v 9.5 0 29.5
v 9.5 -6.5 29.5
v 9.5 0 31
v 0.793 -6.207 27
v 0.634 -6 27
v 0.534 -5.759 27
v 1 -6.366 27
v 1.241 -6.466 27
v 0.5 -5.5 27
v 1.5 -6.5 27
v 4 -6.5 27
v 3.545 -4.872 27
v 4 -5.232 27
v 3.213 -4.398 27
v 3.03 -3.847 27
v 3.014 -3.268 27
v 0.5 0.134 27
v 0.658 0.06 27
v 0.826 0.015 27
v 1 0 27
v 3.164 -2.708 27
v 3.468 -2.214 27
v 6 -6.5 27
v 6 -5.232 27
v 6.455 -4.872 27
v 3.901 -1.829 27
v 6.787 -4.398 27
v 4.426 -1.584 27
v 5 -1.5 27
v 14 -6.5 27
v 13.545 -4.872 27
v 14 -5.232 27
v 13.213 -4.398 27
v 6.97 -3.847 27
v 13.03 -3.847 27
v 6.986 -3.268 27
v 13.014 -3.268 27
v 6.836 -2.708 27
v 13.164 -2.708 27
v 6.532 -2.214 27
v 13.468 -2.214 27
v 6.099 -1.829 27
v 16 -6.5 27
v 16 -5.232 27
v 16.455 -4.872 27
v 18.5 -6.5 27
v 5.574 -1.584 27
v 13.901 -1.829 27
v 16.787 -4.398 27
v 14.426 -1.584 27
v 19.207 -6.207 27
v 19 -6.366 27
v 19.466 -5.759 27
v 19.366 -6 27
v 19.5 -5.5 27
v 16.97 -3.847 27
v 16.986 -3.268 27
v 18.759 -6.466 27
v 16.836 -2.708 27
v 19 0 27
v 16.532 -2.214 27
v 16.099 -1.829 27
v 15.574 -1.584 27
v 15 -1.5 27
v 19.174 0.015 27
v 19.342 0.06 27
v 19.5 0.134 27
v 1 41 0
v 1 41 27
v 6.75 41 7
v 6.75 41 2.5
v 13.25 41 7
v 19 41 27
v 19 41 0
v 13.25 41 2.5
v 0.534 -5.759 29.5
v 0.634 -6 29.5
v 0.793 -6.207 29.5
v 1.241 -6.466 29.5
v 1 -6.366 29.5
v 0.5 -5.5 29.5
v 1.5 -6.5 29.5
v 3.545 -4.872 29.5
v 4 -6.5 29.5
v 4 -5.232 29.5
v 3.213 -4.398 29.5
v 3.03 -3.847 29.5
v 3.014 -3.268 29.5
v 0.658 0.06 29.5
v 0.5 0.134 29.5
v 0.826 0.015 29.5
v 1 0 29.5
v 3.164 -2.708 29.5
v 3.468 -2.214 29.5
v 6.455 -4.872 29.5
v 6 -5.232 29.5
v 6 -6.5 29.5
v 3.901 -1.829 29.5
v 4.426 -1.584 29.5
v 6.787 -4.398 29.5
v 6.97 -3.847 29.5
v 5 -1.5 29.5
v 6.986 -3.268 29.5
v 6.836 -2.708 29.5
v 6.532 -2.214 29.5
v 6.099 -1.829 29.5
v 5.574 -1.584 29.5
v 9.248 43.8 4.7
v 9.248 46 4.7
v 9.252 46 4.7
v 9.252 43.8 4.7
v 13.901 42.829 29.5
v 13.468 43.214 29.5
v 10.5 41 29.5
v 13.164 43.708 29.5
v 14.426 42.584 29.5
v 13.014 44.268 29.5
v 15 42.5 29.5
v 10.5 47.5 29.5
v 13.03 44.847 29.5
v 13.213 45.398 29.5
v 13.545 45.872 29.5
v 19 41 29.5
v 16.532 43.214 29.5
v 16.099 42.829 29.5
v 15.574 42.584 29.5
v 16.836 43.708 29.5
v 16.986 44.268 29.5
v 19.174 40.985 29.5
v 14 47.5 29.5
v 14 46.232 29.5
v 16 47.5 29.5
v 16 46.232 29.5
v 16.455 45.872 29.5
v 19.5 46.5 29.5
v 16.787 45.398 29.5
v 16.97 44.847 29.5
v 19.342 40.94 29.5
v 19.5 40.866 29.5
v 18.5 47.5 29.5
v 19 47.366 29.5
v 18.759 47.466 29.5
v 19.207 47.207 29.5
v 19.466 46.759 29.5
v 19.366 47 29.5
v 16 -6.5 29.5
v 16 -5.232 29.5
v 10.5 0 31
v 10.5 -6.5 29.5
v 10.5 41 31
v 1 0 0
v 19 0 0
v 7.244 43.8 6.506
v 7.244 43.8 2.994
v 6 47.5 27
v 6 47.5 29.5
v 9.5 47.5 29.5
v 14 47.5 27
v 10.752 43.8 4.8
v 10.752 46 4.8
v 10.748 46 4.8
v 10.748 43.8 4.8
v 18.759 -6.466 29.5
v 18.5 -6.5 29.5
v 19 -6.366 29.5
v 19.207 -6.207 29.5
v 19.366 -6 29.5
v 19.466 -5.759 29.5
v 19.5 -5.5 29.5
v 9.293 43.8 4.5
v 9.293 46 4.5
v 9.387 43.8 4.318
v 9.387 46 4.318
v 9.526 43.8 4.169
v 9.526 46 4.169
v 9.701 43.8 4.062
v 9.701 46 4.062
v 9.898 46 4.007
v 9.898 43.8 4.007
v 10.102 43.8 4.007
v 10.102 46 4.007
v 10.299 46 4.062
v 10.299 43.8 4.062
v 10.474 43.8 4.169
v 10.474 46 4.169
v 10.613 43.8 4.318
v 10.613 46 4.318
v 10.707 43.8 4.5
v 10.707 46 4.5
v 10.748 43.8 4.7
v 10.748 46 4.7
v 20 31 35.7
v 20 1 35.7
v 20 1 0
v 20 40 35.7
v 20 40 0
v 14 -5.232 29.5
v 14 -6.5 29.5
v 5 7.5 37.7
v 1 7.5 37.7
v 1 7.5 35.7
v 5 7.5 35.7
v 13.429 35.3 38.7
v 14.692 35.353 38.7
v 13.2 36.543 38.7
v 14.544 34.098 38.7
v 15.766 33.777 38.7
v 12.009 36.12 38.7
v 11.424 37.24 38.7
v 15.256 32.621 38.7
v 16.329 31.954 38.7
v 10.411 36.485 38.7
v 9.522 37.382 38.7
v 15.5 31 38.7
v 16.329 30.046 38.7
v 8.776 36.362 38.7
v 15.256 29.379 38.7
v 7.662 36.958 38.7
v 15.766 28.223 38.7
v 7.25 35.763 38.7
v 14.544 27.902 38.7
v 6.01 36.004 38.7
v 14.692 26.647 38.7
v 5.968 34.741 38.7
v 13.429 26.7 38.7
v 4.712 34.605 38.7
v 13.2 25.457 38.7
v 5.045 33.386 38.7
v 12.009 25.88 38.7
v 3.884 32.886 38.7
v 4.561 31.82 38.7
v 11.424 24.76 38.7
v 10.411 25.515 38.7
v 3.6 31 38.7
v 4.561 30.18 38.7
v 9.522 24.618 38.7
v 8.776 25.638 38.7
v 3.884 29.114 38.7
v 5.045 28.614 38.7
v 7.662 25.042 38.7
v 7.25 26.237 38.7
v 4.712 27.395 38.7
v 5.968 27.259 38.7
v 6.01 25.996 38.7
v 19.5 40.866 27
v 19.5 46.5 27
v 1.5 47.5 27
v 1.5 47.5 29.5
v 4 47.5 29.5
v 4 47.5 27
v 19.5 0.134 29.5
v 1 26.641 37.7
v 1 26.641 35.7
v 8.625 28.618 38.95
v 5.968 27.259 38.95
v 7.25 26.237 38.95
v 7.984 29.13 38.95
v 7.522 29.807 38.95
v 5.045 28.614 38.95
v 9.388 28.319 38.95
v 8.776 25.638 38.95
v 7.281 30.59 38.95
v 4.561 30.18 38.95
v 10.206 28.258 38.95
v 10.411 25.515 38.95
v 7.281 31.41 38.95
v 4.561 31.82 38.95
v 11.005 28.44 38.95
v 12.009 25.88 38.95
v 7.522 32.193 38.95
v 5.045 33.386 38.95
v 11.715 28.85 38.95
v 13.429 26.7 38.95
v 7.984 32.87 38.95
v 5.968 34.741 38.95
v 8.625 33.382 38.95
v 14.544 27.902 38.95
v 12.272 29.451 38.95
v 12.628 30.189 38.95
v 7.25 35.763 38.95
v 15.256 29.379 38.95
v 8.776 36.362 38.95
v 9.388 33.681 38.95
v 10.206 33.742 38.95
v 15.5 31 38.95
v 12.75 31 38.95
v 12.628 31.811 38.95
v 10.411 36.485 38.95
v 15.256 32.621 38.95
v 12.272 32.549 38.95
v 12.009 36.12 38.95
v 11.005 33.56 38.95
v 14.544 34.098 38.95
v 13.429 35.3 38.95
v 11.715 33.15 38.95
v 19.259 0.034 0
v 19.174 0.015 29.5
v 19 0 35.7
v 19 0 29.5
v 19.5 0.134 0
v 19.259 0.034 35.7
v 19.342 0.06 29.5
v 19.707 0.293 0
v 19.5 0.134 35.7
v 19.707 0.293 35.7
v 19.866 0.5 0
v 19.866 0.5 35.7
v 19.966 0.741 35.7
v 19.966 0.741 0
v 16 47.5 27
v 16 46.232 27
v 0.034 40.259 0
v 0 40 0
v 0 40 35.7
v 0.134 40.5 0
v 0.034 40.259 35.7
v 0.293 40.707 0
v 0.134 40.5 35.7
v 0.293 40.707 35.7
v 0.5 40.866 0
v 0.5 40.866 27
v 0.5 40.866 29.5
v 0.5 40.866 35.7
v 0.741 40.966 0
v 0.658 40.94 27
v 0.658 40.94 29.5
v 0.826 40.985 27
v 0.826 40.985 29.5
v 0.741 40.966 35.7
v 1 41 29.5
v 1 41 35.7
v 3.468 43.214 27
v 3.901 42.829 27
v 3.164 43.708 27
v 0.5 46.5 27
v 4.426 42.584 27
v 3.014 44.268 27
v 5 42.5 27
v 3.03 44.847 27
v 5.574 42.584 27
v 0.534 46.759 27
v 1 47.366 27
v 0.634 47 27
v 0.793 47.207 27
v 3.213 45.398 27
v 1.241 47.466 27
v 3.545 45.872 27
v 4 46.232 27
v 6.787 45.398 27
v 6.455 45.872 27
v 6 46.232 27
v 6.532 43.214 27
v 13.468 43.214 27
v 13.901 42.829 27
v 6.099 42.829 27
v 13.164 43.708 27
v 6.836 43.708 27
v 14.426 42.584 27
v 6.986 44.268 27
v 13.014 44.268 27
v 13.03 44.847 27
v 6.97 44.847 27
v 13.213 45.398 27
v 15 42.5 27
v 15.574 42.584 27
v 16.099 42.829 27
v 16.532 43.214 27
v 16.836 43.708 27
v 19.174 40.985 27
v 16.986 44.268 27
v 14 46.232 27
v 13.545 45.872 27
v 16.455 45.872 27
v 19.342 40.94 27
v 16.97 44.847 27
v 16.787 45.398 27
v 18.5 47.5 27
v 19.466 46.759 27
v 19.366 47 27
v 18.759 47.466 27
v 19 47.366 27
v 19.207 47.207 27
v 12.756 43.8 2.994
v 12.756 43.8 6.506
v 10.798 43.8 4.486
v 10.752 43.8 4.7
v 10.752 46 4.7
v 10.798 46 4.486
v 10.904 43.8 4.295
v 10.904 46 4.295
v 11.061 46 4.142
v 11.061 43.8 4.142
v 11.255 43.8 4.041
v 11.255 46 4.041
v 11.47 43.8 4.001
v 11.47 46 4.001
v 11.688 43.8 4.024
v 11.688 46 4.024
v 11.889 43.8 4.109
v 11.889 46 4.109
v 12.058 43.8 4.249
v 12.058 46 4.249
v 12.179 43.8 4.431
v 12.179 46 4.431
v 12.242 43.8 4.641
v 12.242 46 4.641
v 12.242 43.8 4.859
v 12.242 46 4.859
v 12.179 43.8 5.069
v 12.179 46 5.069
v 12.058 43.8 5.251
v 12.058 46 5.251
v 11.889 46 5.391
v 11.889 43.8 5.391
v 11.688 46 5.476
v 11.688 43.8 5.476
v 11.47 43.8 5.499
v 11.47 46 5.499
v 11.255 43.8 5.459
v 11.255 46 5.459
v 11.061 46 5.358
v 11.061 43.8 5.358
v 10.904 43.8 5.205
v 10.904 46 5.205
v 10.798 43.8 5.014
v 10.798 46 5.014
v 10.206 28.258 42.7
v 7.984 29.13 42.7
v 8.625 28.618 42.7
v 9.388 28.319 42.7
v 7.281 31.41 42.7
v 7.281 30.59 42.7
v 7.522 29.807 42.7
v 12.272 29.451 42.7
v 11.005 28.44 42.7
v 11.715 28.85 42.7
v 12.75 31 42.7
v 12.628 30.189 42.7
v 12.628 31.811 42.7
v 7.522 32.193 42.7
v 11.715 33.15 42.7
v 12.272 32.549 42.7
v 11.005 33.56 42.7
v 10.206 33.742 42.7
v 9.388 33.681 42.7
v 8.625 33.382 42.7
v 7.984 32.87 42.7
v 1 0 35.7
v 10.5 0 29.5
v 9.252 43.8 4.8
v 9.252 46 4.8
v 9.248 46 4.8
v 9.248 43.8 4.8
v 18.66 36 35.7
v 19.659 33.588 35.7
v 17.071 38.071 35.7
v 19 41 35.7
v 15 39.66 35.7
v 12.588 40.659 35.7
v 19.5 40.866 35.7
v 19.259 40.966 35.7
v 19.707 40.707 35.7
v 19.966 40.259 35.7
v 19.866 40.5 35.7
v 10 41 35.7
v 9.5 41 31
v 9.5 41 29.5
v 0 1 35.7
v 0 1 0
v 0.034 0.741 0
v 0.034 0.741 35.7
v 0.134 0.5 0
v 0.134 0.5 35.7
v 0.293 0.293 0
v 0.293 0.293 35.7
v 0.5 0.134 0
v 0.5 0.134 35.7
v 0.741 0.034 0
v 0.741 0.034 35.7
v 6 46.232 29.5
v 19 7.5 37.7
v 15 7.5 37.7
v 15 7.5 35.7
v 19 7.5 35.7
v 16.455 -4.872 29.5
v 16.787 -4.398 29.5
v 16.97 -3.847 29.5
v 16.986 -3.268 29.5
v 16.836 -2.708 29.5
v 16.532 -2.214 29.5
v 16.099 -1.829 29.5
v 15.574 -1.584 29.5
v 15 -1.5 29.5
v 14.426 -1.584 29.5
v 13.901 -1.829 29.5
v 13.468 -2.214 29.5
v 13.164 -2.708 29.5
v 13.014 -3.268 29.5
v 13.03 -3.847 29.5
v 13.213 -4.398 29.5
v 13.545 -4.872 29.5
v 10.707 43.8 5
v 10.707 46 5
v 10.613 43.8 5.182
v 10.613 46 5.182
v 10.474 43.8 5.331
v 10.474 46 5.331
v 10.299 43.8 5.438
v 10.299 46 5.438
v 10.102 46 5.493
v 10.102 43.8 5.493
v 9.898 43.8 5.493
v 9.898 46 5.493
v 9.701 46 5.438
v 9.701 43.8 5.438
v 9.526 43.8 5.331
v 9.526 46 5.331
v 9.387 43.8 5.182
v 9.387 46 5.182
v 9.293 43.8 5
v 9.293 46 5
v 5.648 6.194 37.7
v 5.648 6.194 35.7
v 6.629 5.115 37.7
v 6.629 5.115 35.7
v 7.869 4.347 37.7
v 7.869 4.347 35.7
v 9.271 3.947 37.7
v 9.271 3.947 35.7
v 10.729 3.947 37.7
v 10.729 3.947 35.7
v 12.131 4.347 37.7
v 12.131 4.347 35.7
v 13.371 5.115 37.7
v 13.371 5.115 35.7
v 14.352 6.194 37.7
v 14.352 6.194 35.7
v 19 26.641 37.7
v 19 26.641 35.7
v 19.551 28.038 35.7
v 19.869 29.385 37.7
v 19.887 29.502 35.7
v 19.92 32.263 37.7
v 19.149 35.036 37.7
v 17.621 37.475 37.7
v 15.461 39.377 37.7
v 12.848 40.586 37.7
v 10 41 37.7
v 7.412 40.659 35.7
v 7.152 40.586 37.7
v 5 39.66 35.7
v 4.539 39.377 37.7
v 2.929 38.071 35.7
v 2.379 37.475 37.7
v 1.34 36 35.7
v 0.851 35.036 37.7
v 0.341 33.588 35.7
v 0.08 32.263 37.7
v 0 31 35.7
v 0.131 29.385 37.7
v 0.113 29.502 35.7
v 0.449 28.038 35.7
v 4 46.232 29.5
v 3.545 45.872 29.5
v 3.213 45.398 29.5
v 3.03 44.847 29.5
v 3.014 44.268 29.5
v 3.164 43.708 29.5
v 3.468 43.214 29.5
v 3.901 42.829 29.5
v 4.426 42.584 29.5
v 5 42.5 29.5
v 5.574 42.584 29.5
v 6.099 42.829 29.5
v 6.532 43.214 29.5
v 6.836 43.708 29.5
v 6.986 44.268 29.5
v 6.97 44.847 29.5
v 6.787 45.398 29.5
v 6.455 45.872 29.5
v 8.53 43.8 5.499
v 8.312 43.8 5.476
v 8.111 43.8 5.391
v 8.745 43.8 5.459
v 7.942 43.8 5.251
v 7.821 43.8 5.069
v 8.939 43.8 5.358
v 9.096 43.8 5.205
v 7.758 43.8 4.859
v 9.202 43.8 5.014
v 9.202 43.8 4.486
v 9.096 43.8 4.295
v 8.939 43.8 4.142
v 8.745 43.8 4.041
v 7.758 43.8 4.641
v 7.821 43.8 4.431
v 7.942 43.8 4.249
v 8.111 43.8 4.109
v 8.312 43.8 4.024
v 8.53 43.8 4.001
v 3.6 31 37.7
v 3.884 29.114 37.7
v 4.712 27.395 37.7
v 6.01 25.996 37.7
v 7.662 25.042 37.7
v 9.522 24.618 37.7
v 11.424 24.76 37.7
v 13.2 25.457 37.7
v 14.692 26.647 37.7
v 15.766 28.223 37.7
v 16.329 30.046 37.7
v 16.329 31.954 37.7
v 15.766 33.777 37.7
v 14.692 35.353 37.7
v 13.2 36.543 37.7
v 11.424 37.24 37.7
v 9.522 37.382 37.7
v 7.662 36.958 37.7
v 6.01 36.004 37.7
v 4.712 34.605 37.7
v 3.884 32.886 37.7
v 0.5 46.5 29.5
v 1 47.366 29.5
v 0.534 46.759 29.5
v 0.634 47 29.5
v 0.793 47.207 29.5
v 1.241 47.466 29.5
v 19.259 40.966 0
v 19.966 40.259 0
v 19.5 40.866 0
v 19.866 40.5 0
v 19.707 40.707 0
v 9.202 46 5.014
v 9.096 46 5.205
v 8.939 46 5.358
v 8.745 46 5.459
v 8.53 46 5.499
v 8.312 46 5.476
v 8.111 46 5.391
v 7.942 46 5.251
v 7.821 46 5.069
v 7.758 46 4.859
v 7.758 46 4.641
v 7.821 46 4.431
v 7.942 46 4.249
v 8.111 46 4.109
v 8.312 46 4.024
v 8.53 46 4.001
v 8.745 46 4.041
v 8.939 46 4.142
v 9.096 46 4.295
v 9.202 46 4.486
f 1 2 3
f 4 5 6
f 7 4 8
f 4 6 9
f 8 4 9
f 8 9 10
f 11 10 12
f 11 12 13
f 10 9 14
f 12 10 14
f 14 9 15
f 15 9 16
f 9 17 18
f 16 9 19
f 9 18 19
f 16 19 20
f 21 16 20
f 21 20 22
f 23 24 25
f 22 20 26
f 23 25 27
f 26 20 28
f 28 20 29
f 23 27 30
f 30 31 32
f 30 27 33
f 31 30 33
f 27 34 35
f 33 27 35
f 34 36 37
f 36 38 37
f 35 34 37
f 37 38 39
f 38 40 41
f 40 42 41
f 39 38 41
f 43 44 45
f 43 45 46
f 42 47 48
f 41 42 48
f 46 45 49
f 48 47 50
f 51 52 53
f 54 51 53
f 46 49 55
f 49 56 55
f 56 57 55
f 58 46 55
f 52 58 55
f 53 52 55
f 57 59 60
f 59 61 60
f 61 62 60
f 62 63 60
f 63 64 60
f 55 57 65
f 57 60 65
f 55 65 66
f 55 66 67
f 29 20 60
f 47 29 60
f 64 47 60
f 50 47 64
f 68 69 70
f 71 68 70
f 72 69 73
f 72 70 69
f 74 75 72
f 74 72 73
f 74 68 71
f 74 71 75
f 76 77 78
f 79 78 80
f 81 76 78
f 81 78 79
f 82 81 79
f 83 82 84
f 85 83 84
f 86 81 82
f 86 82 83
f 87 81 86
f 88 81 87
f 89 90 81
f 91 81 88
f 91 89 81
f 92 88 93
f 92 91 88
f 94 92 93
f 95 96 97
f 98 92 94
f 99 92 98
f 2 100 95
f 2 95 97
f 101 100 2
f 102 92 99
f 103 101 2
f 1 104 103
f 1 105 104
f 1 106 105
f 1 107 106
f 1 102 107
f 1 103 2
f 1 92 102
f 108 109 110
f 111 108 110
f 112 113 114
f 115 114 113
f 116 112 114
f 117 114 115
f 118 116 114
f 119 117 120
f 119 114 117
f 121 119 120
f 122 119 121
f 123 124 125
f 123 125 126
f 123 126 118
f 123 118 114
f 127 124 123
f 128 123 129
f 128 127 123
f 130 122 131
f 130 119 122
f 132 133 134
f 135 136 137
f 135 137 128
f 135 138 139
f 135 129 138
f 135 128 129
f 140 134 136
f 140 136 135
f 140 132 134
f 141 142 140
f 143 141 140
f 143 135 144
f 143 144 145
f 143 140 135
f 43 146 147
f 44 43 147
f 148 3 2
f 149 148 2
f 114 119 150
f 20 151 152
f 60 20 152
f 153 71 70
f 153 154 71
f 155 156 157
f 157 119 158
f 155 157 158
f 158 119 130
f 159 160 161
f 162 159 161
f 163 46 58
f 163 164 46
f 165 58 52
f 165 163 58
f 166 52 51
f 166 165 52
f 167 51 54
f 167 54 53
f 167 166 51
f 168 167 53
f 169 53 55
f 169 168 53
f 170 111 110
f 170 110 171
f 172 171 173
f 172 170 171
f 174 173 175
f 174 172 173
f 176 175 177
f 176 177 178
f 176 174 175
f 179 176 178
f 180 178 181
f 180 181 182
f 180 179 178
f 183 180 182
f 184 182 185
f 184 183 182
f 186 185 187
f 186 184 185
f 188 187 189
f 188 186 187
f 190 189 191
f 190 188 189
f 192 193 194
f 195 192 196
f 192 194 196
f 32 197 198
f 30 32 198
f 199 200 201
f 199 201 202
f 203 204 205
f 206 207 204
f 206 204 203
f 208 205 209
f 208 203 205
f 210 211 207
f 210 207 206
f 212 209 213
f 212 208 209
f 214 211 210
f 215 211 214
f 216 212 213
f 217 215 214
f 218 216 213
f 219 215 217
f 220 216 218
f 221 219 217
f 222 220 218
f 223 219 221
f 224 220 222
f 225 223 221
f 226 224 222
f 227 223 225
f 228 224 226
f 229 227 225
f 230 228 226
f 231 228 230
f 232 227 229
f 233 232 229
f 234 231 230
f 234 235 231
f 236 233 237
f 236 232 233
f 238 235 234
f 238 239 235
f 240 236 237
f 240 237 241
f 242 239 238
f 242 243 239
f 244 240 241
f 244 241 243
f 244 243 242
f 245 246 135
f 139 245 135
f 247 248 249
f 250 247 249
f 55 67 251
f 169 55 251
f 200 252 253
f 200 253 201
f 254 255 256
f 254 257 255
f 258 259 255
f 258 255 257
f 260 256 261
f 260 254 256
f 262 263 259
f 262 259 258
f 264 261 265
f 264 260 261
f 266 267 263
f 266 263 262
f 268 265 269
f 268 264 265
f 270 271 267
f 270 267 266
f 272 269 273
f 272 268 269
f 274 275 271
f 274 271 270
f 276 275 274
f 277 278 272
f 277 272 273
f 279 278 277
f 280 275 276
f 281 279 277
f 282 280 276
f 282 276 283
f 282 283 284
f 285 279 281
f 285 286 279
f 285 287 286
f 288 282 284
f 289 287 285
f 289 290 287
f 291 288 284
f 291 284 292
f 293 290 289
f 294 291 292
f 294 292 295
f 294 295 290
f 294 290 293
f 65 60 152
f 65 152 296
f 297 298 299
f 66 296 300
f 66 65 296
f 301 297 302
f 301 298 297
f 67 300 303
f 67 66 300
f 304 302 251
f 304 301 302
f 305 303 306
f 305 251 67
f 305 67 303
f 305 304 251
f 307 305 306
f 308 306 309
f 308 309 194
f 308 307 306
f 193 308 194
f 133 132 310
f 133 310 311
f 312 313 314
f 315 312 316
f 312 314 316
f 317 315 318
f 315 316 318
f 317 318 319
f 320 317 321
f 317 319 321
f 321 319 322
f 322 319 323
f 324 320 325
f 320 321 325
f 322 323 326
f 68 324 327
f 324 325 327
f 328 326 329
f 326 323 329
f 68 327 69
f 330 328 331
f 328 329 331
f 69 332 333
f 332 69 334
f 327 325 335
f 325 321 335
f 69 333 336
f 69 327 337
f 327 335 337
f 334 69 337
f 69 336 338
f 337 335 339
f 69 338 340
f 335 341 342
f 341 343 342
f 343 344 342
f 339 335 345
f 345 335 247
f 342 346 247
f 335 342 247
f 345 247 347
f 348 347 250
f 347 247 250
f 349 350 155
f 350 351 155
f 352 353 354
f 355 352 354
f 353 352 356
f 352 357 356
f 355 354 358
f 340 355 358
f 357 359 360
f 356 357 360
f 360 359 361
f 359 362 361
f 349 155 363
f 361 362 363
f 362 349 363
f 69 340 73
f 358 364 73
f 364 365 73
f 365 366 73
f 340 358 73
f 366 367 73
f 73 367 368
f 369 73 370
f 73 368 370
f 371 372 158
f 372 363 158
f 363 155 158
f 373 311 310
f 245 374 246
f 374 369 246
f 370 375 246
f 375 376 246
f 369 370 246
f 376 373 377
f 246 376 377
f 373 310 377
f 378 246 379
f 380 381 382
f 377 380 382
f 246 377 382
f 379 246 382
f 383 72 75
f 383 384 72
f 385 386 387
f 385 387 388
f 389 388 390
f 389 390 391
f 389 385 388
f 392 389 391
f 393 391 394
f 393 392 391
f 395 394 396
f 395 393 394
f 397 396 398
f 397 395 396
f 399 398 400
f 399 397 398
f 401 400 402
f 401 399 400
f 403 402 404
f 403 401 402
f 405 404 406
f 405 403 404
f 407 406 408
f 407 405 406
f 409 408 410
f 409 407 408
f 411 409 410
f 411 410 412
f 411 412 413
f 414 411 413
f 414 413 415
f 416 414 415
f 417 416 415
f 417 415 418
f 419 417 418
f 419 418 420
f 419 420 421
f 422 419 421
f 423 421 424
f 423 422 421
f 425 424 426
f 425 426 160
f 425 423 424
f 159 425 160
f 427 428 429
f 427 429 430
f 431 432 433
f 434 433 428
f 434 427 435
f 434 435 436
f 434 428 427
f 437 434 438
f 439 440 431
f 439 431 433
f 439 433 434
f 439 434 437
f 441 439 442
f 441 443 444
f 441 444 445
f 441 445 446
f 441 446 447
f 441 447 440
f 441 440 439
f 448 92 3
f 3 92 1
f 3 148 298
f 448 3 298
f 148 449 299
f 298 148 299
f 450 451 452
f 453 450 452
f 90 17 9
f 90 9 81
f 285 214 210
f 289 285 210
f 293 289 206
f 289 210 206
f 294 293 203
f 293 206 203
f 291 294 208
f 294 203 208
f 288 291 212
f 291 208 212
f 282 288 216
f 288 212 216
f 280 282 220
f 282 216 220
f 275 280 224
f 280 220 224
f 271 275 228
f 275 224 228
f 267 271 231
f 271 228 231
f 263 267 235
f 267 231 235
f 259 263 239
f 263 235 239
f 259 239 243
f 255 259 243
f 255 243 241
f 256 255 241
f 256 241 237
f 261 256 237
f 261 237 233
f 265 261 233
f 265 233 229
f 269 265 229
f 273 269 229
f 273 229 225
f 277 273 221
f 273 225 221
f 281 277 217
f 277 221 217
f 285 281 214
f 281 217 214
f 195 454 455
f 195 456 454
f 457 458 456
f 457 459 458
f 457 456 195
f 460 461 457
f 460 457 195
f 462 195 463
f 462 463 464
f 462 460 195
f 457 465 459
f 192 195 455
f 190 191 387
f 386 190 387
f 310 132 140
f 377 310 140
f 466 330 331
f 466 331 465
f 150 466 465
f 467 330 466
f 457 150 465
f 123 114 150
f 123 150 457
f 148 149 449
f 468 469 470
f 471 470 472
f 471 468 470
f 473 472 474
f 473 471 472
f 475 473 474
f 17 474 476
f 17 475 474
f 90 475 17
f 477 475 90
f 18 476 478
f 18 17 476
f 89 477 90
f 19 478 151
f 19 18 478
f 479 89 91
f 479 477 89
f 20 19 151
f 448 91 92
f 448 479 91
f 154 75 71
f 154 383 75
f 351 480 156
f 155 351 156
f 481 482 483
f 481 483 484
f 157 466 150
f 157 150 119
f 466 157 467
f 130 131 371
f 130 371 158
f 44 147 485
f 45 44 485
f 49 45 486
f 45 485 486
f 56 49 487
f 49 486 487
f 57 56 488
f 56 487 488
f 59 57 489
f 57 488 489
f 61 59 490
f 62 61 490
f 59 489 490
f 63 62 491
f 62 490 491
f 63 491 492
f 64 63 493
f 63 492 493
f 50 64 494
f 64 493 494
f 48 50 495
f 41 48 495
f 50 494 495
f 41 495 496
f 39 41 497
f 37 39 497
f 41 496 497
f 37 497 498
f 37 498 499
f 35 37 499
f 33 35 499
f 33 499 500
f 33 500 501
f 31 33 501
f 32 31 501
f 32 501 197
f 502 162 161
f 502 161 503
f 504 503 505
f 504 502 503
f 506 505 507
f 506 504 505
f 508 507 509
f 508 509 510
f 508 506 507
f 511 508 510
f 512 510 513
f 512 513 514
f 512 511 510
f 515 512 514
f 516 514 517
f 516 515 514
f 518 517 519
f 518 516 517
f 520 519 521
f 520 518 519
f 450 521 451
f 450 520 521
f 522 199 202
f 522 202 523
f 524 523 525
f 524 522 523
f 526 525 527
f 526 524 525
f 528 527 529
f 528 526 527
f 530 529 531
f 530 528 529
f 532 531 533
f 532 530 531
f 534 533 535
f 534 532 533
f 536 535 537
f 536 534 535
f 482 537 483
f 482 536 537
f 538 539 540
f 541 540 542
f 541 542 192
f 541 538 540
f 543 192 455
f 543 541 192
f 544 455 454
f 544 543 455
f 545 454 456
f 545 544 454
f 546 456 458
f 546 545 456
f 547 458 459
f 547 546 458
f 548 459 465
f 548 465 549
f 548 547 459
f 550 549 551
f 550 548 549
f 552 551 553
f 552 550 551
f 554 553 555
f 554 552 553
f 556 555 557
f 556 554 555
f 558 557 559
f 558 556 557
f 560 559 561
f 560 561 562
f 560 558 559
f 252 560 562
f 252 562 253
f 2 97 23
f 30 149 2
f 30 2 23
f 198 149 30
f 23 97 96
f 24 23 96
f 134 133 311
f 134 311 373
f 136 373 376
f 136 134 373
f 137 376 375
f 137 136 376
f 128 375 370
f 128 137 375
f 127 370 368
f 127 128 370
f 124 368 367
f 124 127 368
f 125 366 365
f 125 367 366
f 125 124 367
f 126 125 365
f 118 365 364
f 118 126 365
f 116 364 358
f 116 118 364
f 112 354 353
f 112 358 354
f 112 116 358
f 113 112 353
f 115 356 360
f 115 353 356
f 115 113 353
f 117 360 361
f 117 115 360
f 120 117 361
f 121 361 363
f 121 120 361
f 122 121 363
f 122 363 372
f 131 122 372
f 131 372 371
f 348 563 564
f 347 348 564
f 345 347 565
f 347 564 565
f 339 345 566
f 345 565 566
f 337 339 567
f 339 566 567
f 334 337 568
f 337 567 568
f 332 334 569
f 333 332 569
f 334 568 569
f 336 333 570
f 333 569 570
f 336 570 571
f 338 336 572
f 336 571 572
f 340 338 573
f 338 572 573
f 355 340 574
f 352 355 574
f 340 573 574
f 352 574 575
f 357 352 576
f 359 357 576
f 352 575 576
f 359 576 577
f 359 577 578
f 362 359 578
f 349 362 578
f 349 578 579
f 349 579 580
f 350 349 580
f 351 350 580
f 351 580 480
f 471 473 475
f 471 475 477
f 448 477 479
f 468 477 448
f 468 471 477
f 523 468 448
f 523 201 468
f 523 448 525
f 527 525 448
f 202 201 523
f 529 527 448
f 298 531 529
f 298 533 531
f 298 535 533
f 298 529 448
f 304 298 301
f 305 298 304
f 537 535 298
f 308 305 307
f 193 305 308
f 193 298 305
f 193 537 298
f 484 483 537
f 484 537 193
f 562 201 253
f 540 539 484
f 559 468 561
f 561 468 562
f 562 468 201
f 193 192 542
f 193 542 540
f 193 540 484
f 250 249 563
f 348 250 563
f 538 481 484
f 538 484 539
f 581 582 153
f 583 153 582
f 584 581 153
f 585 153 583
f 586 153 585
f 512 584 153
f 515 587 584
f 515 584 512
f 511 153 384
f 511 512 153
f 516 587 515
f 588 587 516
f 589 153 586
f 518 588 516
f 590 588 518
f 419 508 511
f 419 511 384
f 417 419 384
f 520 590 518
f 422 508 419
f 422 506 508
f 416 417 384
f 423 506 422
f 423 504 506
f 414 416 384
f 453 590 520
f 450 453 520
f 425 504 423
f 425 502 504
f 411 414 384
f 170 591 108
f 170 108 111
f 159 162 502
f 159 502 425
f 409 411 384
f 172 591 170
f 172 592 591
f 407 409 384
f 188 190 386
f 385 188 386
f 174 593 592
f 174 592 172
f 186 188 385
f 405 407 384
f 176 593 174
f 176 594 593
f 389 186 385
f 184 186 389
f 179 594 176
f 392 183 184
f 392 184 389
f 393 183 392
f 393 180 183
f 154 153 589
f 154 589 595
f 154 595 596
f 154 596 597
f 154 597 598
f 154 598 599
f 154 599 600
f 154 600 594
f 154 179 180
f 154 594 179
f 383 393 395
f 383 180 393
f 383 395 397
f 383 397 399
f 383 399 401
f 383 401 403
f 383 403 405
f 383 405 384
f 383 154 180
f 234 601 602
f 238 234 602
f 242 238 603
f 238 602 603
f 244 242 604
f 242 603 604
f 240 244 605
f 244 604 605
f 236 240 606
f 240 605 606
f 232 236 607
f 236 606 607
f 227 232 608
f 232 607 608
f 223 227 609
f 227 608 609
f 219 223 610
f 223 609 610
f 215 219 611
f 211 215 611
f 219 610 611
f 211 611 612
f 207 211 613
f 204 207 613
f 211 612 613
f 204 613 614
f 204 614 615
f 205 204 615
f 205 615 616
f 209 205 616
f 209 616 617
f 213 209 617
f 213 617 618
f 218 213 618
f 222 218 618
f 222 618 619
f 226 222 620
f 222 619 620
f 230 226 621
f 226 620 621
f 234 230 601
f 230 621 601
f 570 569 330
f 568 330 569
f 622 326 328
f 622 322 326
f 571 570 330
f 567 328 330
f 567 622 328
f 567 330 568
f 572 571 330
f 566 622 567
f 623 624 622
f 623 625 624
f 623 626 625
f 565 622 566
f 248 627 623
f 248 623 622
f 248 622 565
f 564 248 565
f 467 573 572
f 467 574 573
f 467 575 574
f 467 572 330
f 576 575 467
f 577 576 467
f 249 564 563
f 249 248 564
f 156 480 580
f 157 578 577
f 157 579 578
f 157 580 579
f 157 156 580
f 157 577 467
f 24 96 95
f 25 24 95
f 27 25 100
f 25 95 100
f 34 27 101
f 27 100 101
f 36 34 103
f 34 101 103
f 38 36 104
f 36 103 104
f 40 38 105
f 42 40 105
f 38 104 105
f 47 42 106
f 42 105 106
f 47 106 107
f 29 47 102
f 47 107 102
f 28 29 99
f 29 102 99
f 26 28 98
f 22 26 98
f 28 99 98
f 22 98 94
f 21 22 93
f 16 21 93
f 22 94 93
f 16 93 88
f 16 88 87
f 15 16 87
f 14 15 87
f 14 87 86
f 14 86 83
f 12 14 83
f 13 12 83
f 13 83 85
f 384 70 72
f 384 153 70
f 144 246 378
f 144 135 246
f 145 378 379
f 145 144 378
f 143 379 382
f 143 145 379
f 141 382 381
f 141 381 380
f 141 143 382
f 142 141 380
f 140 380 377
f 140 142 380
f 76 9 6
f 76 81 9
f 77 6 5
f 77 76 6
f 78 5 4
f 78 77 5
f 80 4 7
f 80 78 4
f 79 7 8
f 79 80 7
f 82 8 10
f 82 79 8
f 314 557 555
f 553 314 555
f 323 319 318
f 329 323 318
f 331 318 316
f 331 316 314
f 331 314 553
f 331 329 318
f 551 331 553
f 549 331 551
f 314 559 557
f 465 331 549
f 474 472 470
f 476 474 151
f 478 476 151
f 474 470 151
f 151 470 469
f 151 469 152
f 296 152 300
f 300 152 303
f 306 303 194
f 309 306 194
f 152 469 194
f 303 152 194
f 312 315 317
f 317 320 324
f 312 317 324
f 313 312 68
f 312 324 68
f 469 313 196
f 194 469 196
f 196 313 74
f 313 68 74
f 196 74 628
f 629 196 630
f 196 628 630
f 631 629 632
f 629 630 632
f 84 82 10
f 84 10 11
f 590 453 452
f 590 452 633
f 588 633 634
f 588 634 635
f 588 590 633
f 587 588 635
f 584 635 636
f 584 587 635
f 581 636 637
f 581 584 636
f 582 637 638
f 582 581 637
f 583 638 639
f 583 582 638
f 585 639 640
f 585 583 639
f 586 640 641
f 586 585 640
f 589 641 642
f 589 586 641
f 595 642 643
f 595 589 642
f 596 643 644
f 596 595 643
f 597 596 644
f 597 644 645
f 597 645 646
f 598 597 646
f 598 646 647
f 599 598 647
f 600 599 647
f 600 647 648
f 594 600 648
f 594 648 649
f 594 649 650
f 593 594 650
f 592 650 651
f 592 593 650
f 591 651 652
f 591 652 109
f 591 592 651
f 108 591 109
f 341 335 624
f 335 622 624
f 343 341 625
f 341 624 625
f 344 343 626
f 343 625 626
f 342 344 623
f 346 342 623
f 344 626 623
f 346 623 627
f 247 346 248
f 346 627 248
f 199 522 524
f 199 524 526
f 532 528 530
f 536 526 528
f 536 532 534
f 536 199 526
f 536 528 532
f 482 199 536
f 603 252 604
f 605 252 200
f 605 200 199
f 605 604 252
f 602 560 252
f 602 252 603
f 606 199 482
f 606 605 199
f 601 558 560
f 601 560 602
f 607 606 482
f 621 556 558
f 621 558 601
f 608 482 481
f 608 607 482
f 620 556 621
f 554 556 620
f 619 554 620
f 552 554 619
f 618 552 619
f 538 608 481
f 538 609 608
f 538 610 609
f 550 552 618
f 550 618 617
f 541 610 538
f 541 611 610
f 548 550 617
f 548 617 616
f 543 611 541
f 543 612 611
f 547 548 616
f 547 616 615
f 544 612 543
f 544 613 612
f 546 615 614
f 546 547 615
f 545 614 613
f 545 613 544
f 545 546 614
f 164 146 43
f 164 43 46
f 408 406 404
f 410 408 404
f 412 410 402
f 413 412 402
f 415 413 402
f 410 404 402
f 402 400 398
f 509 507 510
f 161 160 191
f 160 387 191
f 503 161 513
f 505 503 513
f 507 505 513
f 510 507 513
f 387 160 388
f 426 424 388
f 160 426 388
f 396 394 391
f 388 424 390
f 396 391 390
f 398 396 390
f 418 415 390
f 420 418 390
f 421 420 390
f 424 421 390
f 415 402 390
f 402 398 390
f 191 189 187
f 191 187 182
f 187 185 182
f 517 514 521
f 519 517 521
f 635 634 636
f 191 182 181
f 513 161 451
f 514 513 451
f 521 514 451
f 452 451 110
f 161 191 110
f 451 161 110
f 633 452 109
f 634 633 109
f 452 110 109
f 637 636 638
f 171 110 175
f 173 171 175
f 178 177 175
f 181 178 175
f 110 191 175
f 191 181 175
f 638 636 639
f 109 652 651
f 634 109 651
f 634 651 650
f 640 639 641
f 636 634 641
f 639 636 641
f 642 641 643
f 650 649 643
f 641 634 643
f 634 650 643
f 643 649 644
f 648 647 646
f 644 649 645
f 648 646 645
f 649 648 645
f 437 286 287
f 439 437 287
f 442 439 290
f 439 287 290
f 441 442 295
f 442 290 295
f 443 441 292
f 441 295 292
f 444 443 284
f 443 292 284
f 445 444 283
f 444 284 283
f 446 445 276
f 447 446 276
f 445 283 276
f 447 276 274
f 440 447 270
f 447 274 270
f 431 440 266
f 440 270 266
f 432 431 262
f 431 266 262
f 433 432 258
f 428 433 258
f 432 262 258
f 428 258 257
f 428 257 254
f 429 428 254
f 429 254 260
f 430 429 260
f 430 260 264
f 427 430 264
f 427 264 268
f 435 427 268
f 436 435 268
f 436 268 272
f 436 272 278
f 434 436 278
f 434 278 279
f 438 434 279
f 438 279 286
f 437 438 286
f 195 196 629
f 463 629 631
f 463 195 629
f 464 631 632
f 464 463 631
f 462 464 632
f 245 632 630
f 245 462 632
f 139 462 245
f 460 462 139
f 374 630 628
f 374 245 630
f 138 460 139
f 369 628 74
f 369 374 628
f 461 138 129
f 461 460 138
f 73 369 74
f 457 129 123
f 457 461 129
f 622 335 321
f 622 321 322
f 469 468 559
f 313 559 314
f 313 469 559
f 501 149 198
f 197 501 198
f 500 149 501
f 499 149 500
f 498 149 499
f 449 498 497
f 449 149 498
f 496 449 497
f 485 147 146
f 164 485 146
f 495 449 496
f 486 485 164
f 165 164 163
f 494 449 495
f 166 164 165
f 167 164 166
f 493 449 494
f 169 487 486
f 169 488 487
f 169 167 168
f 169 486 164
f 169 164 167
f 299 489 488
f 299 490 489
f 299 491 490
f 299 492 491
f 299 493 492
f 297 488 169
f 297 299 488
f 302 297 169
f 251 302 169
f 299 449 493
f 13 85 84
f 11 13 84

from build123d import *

# Parameters (mm, degrees)
ESQUISSE1_W              = 20
ESQUISSE1_H              = 41
BOSS_EXTRU_1_DEPTH       = 37.7
CONG_1_R                 = 1
BOSS_EXTRU_2_DEPTH       = 6.5
BOSS_EXTRU_2_DEPTH_BACK  = 47.5
ESQUISSE2_W              = 19
ESQUISSE2_H              = 2.5
ESQUISSE3_R              = 6.4
BOSS_EXTRU_3_DEPTH       = 1
ESQUISSE4_R              = 2.75
BOSS_EXTRU_4_DEPTH       = 4
ENL_V_MAT_EXTRU_1_DEPTH  = 4
ESQUISSE6_W              = 6.5
ESQUISSE6_H              = 4.5
BOSS_EXTRU_6_DEPTH       = 2.8
BOSS_EXTRU_6_TAPER       = 10
BOSS_EXTRU_12_DEPTH      = 2.2
BOSS_EXTRU_13_DEPTH      = 0.5
BOSS_EXTRU_13_DEPTH_BACK = 0.5
ESQUISSE8_W              = 34.833277075
ESQUISSE8_H              = 46.278938305
ENL_V_MAT_EXTRU_2_DEPTH  = 2
CONG_2_R                 = 1
ESQUISSE9_R              = 5.5
BOSS_EXTRU_14_DEPTH      = 0.25


with BuildPart() as part:
    # Esquisse1 → Boss.-Extru.1 (new body)
    with BuildSketch(Plane.XY):
        with Locations((10, 20.5)):
            Rectangle(ESQUISSE1_W, ESQUISSE1_H)
    extrude(amount=BOSS_EXTRU_1_DEPTH)

    # Congé1
    cong_1_edges = [part.edges().sort_by_distance(p)[0] for p in [
        (0, 41, 18.85),
        (20, 41, 18.85),
        (20, 0, 18.85),
        (0, 0, 18.85),
    ]]
    fillet(cong_1_edges, radius=CONG_1_R)

    # Esquisse2 → Boss.-Extru.2 (add, two sides: drawn at the far end of the back side and taken through both)
    with BuildSketch(Plane.XZ.offset(-BOSS_EXTRU_2_DEPTH_BACK)):
        with Locations((10, 28.25)):
            Rectangle(ESQUISSE2_W, ESQUISSE2_H)
    extrude(amount=BOSS_EXTRU_2_DEPTH + BOSS_EXTRU_2_DEPTH_BACK)

    # Esquisse3 → Boss.-Extru.3 (add)
    with BuildSketch(Plane.XY.offset(37.7)):
        with Locations(Location((10, 31, 0), (0, 0, 180))):
            Circle(ESQUISSE3_R)
    extrude(amount=BOSS_EXTRU_3_DEPTH)

    # Esquisse4 → Boss.-Extru.4 (add)
    with BuildSketch(Plane.XY.offset(38.7)):
        with Locations((10, 31)):
            Circle(ESQUISSE4_R)
    extrude(amount=BOSS_EXTRU_4_DEPTH)

    # Esquisse5 → Enlèv. mat.-Extru.1 (cut)
    with BuildSketch(Plane.XY.offset(29.5)):
        with BuildLine():
            ThreePointArc((16, 46.232050808), (15, 42.5), (14, 46.232050808))
            Line((14, 46.232050808), (14, 48.5))
            Line((14, 48.5), (16, 48.5))
            Line((16, 48.5), (16, 46.232050808))
        make_face()
        with BuildLine():
            Line((4, 48.5), (4, 46.232050808))
            ThreePointArc((4, 46.232050808), (5, 42.5), (6, 46.232050808))
            Line((6, 46.232050808), (6, 48.5))
            Line((6, 48.5), (4, 48.5))
        make_face()
        with BuildLine():
            Line((4, -6.5), (6, -6.5))
            Line((6, -6.5), (6, -5.232050808))
            ThreePointArc((6, -5.232050808), (5, -1.5), (4, -5.232050808))
            Line((4, -5.232050808), (4, -6.5))
        make_face()
        with BuildLine():
            Line((14, -6.5), (16, -6.5))
            Line((16, -6.5), (16, -5.232050808))
            ThreePointArc((16, -5.232050808), (15, -1.5), (14, -5.232050808))
            Line((14, -5.232050808), (14, -6.5))
        make_face()
    extrude(amount=-ENL_V_MAT_EXTRU_1_DEPTH, mode=Mode.SUBTRACT)

    # Esquisse6 → Boss.-Extru.6 (add)
    with BuildSketch(Plane(origin=(0, 41, 0), x_dir=(1, 0, 0), z_dir=(0, 1, 0))):
        with Locations((10, -4.75)):
            Rectangle(ESQUISSE6_W, ESQUISSE6_H)
    extrude(amount=BOSS_EXTRU_6_DEPTH, taper=BOSS_EXTRU_6_TAPER)

    # Esquisse7 → Boss.-Extru.12 (add)
    with BuildSketch(Plane(origin=(0, 43.8, 0), x_dir=(1, 0, 0), z_dir=(0, 1, 0))):
        with BuildLine():
            Line((10.751668523, -4.8), (10.748331477, -4.8))
            ThreePointArc((10.748331477, -4.8), (10, -5.5), (9.251668523, -4.8))
            Line((9.251668523, -4.8), (9.248331477, -4.8))
            ThreePointArc((9.248331477, -4.8), (7.75, -4.75), (9.248331477, -4.7))
            Line((9.248331477, -4.7), (9.251668523, -4.7))
            ThreePointArc((9.251668523, -4.7), (10, -4), (10.748331477, -4.7))
            Line((10.748331477, -4.7), (10.751668523, -4.7))
            ThreePointArc((10.751668523, -4.7), (12.25, -4.75), (10.751668523, -4.8))
        make_face()
    extrude(amount=BOSS_EXTRU_12_DEPTH)

    # Esquisse3D1 → Boss.-Extru.13 (add, two sides: drawn at the far end of the back side and taken through both)
    with BuildSketch(Plane(origin=(10, -6.5, 29.5), x_dir=(0, 1, 0), z_dir=(1, 0, 0)).offset(-BOSS_EXTRU_13_DEPTH_BACK)):
        Polygon((0, 0), (6.5, 0), (6.5, 1.5), align=None)
        Polygon((54, 0), (47.5, 0), (47.5, 1.5), align=None)
    extrude(amount=BOSS_EXTRU_13_DEPTH + BOSS_EXTRU_13_DEPTH_BACK)

    # Esquisse8 → Enlèv. mat.-Extru.2 (cut)
    with BuildSketch(Plane.XY.offset(37.7)):
        with Locations((11.272378628, 21.882709323)):
            Rectangle(ESQUISSE8_W, ESQUISSE8_H)
        with BuildLine():
            Line((1, 26.641101056), (1, 7.5))
            Line((1, 7.5), (5, 7.5))
            ThreePointArc((5, 7.5), (10, 3.896834669), (15, 7.5))
            Line((15, 7.5), (19, 7.5))
            Line((19, 7.5), (19, 26.641101056))
            ThreePointArc((19, 26.641101056), (10, 41), (1, 26.641101056))
        make_face(mode=Mode.SUBTRACT)
    extrude(amount=-ENL_V_MAT_EXTRU_2_DEPTH, mode=Mode.SUBTRACT)

    # Congé2
    cong_2_edges = [part.edges().sort_by_distance(p)[0] for p in [
        (0.5, 47.5, 28.25),
        (19.5, 47.5, 28.25),
        (0.5, -6.5, 28.25),
        (19.5, -6.5, 28.25),
    ]]
    fillet(cong_2_edges, radius=CONG_2_R)

    # Esquisse9 → Boss.-Extru.14 (add)
    with BuildSketch(Plane.XY.offset(38.7)):
        with Locations((10, 31)):
            Circle(ESQUISSE9_R)
    extrude(amount=BOSS_EXTRU_14_DEPTH)


solid = part.part
